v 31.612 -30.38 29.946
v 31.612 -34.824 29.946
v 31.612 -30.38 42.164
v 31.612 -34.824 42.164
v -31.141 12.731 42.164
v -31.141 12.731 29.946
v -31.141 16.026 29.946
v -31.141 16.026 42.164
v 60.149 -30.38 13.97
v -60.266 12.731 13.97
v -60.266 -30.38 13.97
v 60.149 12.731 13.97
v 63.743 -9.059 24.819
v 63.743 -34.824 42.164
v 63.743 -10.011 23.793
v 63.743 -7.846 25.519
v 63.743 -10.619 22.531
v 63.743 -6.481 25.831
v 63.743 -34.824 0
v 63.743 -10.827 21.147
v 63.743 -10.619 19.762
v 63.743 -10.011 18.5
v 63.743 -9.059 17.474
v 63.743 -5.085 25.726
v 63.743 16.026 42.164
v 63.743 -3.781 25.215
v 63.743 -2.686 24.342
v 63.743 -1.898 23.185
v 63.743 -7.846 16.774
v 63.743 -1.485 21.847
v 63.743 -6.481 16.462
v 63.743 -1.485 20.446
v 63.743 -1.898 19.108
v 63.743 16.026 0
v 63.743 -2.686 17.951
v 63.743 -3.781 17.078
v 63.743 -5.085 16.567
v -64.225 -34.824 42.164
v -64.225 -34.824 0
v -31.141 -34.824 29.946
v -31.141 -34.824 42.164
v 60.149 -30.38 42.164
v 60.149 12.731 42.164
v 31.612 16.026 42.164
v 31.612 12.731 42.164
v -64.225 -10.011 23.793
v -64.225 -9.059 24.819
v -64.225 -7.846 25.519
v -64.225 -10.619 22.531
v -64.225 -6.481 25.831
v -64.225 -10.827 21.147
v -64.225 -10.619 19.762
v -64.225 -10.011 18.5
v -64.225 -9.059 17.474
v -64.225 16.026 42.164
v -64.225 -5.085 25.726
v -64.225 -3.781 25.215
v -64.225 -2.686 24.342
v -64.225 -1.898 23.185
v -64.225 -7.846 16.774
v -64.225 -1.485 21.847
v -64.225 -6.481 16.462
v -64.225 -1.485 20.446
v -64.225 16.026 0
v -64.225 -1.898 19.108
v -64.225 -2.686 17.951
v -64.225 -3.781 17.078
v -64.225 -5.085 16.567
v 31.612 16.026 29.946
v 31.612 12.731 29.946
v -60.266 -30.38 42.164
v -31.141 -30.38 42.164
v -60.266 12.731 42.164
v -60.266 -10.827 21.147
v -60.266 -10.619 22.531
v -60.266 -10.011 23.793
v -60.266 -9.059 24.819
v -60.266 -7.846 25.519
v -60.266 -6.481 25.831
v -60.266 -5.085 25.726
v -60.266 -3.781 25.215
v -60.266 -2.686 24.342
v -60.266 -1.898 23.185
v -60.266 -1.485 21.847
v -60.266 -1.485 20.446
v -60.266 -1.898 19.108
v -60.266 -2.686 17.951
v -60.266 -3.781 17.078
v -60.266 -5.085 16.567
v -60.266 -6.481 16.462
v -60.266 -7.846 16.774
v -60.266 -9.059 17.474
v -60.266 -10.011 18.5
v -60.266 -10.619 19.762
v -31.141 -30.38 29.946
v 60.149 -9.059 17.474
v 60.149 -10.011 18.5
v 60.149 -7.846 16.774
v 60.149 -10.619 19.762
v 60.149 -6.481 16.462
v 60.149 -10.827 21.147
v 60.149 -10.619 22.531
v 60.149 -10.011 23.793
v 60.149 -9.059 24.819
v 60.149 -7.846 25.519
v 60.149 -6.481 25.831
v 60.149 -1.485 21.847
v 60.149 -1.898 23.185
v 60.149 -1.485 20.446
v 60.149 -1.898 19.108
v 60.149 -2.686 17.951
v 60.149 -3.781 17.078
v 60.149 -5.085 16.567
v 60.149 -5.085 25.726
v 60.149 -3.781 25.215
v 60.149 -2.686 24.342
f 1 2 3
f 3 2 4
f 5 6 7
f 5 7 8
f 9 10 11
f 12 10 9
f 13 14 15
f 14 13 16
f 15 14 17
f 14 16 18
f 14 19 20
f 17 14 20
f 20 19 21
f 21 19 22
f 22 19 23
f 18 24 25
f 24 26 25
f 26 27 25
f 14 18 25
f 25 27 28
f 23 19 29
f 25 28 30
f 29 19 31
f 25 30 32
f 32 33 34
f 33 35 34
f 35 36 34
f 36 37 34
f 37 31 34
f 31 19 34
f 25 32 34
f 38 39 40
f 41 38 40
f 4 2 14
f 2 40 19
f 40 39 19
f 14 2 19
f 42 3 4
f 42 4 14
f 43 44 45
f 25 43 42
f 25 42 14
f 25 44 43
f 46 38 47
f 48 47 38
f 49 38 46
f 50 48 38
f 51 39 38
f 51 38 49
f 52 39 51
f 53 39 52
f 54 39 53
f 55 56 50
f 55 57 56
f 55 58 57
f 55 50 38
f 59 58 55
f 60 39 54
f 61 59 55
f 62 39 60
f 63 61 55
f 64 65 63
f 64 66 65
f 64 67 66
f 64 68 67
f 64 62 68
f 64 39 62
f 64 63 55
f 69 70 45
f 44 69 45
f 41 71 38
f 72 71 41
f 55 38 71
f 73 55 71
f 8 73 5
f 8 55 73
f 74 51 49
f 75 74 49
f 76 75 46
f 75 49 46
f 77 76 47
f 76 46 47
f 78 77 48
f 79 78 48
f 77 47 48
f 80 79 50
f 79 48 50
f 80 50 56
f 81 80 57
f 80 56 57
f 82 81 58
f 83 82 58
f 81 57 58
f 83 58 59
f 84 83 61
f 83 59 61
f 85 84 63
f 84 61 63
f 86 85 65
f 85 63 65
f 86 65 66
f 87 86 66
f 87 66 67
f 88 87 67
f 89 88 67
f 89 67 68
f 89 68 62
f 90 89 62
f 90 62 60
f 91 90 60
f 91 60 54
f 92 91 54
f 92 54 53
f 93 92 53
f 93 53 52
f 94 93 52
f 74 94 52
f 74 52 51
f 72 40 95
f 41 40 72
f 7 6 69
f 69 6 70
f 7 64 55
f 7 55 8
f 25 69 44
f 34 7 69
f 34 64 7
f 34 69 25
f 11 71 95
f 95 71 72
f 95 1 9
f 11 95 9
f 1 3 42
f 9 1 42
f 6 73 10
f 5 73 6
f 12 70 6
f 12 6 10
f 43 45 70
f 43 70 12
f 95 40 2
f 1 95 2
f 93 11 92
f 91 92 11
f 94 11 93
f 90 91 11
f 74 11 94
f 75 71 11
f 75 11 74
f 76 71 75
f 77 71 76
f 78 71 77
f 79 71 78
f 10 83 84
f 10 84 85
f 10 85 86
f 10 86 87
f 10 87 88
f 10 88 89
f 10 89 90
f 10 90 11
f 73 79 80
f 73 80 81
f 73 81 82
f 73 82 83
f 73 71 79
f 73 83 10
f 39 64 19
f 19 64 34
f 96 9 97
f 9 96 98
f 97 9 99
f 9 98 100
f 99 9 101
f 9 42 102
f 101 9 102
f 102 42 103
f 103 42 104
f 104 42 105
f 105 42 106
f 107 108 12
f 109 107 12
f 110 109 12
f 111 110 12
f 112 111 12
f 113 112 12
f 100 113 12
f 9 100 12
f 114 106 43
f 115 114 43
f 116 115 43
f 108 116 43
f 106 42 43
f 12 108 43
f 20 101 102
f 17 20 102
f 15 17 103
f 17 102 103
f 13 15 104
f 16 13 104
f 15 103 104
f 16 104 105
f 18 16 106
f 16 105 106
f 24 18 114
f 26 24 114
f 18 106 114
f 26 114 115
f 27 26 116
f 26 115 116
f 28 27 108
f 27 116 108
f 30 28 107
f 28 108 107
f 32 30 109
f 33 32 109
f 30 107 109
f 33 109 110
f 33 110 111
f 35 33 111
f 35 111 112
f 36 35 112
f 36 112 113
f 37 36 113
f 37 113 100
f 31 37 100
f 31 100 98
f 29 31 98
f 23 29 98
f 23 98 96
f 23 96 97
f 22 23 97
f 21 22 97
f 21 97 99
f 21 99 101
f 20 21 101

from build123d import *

# Parameters (mm, degrees)
F0_W     = 127.9677972198
F0_H     = 50.8497301489
F1_DEPTH = 42.164
F3_W     = 120.4143241048
F3_H     = 43.1107841432
F4_DEPTH = 28.194
F2_W     = 62.752943486
F2_H     = 12.2181459024
F5_DEPTH = 61.468
F6_R     = 4.6974309297
F7_DEPTH = 174.498


with BuildPart() as f1:
    # F0 (on Top) → F1 (new body)
    with BuildSketch(Plane.XY):
        with Locations((-0.2409927547, -9.3987649307)):
            Rectangle(F0_W, F0_H)
    extrude(amount=F1_DEPTH)

    # F3 (on face) → F4 (cut)
    with BuildSketch(Plane.XY.offset(42.164)):
        with Locations((-0.0583641231, -8.8241919875)):
            Rectangle(F3_W, F3_H)
    extrude(amount=-F4_DEPTH, mode=Mode.SUBTRACT)

    # F2 (on face) → F5 (cut)
    with BuildSketch(Plane.XZ.offset(34.8236300051)):
        with Locations((0.2353247255, 36.0549270488)):
            Rectangle(F2_W, F2_H)
    extrude(amount=-F5_DEPTH, mode=Mode.SUBTRACT)

    # F6 (on face) → F7 (cut)
    with BuildSketch(Plane(origin=(-64.2248913646, 0, 0), x_dir=(0, -1, 0), z_dir=(-1, 0, 0))):
        with Locations((6.1297980137, 21.1465246975)):
            Circle(F6_R)
    extrude(amount=-F7_DEPTH, mode=Mode.SUBTRACT)


solid = f1.part
